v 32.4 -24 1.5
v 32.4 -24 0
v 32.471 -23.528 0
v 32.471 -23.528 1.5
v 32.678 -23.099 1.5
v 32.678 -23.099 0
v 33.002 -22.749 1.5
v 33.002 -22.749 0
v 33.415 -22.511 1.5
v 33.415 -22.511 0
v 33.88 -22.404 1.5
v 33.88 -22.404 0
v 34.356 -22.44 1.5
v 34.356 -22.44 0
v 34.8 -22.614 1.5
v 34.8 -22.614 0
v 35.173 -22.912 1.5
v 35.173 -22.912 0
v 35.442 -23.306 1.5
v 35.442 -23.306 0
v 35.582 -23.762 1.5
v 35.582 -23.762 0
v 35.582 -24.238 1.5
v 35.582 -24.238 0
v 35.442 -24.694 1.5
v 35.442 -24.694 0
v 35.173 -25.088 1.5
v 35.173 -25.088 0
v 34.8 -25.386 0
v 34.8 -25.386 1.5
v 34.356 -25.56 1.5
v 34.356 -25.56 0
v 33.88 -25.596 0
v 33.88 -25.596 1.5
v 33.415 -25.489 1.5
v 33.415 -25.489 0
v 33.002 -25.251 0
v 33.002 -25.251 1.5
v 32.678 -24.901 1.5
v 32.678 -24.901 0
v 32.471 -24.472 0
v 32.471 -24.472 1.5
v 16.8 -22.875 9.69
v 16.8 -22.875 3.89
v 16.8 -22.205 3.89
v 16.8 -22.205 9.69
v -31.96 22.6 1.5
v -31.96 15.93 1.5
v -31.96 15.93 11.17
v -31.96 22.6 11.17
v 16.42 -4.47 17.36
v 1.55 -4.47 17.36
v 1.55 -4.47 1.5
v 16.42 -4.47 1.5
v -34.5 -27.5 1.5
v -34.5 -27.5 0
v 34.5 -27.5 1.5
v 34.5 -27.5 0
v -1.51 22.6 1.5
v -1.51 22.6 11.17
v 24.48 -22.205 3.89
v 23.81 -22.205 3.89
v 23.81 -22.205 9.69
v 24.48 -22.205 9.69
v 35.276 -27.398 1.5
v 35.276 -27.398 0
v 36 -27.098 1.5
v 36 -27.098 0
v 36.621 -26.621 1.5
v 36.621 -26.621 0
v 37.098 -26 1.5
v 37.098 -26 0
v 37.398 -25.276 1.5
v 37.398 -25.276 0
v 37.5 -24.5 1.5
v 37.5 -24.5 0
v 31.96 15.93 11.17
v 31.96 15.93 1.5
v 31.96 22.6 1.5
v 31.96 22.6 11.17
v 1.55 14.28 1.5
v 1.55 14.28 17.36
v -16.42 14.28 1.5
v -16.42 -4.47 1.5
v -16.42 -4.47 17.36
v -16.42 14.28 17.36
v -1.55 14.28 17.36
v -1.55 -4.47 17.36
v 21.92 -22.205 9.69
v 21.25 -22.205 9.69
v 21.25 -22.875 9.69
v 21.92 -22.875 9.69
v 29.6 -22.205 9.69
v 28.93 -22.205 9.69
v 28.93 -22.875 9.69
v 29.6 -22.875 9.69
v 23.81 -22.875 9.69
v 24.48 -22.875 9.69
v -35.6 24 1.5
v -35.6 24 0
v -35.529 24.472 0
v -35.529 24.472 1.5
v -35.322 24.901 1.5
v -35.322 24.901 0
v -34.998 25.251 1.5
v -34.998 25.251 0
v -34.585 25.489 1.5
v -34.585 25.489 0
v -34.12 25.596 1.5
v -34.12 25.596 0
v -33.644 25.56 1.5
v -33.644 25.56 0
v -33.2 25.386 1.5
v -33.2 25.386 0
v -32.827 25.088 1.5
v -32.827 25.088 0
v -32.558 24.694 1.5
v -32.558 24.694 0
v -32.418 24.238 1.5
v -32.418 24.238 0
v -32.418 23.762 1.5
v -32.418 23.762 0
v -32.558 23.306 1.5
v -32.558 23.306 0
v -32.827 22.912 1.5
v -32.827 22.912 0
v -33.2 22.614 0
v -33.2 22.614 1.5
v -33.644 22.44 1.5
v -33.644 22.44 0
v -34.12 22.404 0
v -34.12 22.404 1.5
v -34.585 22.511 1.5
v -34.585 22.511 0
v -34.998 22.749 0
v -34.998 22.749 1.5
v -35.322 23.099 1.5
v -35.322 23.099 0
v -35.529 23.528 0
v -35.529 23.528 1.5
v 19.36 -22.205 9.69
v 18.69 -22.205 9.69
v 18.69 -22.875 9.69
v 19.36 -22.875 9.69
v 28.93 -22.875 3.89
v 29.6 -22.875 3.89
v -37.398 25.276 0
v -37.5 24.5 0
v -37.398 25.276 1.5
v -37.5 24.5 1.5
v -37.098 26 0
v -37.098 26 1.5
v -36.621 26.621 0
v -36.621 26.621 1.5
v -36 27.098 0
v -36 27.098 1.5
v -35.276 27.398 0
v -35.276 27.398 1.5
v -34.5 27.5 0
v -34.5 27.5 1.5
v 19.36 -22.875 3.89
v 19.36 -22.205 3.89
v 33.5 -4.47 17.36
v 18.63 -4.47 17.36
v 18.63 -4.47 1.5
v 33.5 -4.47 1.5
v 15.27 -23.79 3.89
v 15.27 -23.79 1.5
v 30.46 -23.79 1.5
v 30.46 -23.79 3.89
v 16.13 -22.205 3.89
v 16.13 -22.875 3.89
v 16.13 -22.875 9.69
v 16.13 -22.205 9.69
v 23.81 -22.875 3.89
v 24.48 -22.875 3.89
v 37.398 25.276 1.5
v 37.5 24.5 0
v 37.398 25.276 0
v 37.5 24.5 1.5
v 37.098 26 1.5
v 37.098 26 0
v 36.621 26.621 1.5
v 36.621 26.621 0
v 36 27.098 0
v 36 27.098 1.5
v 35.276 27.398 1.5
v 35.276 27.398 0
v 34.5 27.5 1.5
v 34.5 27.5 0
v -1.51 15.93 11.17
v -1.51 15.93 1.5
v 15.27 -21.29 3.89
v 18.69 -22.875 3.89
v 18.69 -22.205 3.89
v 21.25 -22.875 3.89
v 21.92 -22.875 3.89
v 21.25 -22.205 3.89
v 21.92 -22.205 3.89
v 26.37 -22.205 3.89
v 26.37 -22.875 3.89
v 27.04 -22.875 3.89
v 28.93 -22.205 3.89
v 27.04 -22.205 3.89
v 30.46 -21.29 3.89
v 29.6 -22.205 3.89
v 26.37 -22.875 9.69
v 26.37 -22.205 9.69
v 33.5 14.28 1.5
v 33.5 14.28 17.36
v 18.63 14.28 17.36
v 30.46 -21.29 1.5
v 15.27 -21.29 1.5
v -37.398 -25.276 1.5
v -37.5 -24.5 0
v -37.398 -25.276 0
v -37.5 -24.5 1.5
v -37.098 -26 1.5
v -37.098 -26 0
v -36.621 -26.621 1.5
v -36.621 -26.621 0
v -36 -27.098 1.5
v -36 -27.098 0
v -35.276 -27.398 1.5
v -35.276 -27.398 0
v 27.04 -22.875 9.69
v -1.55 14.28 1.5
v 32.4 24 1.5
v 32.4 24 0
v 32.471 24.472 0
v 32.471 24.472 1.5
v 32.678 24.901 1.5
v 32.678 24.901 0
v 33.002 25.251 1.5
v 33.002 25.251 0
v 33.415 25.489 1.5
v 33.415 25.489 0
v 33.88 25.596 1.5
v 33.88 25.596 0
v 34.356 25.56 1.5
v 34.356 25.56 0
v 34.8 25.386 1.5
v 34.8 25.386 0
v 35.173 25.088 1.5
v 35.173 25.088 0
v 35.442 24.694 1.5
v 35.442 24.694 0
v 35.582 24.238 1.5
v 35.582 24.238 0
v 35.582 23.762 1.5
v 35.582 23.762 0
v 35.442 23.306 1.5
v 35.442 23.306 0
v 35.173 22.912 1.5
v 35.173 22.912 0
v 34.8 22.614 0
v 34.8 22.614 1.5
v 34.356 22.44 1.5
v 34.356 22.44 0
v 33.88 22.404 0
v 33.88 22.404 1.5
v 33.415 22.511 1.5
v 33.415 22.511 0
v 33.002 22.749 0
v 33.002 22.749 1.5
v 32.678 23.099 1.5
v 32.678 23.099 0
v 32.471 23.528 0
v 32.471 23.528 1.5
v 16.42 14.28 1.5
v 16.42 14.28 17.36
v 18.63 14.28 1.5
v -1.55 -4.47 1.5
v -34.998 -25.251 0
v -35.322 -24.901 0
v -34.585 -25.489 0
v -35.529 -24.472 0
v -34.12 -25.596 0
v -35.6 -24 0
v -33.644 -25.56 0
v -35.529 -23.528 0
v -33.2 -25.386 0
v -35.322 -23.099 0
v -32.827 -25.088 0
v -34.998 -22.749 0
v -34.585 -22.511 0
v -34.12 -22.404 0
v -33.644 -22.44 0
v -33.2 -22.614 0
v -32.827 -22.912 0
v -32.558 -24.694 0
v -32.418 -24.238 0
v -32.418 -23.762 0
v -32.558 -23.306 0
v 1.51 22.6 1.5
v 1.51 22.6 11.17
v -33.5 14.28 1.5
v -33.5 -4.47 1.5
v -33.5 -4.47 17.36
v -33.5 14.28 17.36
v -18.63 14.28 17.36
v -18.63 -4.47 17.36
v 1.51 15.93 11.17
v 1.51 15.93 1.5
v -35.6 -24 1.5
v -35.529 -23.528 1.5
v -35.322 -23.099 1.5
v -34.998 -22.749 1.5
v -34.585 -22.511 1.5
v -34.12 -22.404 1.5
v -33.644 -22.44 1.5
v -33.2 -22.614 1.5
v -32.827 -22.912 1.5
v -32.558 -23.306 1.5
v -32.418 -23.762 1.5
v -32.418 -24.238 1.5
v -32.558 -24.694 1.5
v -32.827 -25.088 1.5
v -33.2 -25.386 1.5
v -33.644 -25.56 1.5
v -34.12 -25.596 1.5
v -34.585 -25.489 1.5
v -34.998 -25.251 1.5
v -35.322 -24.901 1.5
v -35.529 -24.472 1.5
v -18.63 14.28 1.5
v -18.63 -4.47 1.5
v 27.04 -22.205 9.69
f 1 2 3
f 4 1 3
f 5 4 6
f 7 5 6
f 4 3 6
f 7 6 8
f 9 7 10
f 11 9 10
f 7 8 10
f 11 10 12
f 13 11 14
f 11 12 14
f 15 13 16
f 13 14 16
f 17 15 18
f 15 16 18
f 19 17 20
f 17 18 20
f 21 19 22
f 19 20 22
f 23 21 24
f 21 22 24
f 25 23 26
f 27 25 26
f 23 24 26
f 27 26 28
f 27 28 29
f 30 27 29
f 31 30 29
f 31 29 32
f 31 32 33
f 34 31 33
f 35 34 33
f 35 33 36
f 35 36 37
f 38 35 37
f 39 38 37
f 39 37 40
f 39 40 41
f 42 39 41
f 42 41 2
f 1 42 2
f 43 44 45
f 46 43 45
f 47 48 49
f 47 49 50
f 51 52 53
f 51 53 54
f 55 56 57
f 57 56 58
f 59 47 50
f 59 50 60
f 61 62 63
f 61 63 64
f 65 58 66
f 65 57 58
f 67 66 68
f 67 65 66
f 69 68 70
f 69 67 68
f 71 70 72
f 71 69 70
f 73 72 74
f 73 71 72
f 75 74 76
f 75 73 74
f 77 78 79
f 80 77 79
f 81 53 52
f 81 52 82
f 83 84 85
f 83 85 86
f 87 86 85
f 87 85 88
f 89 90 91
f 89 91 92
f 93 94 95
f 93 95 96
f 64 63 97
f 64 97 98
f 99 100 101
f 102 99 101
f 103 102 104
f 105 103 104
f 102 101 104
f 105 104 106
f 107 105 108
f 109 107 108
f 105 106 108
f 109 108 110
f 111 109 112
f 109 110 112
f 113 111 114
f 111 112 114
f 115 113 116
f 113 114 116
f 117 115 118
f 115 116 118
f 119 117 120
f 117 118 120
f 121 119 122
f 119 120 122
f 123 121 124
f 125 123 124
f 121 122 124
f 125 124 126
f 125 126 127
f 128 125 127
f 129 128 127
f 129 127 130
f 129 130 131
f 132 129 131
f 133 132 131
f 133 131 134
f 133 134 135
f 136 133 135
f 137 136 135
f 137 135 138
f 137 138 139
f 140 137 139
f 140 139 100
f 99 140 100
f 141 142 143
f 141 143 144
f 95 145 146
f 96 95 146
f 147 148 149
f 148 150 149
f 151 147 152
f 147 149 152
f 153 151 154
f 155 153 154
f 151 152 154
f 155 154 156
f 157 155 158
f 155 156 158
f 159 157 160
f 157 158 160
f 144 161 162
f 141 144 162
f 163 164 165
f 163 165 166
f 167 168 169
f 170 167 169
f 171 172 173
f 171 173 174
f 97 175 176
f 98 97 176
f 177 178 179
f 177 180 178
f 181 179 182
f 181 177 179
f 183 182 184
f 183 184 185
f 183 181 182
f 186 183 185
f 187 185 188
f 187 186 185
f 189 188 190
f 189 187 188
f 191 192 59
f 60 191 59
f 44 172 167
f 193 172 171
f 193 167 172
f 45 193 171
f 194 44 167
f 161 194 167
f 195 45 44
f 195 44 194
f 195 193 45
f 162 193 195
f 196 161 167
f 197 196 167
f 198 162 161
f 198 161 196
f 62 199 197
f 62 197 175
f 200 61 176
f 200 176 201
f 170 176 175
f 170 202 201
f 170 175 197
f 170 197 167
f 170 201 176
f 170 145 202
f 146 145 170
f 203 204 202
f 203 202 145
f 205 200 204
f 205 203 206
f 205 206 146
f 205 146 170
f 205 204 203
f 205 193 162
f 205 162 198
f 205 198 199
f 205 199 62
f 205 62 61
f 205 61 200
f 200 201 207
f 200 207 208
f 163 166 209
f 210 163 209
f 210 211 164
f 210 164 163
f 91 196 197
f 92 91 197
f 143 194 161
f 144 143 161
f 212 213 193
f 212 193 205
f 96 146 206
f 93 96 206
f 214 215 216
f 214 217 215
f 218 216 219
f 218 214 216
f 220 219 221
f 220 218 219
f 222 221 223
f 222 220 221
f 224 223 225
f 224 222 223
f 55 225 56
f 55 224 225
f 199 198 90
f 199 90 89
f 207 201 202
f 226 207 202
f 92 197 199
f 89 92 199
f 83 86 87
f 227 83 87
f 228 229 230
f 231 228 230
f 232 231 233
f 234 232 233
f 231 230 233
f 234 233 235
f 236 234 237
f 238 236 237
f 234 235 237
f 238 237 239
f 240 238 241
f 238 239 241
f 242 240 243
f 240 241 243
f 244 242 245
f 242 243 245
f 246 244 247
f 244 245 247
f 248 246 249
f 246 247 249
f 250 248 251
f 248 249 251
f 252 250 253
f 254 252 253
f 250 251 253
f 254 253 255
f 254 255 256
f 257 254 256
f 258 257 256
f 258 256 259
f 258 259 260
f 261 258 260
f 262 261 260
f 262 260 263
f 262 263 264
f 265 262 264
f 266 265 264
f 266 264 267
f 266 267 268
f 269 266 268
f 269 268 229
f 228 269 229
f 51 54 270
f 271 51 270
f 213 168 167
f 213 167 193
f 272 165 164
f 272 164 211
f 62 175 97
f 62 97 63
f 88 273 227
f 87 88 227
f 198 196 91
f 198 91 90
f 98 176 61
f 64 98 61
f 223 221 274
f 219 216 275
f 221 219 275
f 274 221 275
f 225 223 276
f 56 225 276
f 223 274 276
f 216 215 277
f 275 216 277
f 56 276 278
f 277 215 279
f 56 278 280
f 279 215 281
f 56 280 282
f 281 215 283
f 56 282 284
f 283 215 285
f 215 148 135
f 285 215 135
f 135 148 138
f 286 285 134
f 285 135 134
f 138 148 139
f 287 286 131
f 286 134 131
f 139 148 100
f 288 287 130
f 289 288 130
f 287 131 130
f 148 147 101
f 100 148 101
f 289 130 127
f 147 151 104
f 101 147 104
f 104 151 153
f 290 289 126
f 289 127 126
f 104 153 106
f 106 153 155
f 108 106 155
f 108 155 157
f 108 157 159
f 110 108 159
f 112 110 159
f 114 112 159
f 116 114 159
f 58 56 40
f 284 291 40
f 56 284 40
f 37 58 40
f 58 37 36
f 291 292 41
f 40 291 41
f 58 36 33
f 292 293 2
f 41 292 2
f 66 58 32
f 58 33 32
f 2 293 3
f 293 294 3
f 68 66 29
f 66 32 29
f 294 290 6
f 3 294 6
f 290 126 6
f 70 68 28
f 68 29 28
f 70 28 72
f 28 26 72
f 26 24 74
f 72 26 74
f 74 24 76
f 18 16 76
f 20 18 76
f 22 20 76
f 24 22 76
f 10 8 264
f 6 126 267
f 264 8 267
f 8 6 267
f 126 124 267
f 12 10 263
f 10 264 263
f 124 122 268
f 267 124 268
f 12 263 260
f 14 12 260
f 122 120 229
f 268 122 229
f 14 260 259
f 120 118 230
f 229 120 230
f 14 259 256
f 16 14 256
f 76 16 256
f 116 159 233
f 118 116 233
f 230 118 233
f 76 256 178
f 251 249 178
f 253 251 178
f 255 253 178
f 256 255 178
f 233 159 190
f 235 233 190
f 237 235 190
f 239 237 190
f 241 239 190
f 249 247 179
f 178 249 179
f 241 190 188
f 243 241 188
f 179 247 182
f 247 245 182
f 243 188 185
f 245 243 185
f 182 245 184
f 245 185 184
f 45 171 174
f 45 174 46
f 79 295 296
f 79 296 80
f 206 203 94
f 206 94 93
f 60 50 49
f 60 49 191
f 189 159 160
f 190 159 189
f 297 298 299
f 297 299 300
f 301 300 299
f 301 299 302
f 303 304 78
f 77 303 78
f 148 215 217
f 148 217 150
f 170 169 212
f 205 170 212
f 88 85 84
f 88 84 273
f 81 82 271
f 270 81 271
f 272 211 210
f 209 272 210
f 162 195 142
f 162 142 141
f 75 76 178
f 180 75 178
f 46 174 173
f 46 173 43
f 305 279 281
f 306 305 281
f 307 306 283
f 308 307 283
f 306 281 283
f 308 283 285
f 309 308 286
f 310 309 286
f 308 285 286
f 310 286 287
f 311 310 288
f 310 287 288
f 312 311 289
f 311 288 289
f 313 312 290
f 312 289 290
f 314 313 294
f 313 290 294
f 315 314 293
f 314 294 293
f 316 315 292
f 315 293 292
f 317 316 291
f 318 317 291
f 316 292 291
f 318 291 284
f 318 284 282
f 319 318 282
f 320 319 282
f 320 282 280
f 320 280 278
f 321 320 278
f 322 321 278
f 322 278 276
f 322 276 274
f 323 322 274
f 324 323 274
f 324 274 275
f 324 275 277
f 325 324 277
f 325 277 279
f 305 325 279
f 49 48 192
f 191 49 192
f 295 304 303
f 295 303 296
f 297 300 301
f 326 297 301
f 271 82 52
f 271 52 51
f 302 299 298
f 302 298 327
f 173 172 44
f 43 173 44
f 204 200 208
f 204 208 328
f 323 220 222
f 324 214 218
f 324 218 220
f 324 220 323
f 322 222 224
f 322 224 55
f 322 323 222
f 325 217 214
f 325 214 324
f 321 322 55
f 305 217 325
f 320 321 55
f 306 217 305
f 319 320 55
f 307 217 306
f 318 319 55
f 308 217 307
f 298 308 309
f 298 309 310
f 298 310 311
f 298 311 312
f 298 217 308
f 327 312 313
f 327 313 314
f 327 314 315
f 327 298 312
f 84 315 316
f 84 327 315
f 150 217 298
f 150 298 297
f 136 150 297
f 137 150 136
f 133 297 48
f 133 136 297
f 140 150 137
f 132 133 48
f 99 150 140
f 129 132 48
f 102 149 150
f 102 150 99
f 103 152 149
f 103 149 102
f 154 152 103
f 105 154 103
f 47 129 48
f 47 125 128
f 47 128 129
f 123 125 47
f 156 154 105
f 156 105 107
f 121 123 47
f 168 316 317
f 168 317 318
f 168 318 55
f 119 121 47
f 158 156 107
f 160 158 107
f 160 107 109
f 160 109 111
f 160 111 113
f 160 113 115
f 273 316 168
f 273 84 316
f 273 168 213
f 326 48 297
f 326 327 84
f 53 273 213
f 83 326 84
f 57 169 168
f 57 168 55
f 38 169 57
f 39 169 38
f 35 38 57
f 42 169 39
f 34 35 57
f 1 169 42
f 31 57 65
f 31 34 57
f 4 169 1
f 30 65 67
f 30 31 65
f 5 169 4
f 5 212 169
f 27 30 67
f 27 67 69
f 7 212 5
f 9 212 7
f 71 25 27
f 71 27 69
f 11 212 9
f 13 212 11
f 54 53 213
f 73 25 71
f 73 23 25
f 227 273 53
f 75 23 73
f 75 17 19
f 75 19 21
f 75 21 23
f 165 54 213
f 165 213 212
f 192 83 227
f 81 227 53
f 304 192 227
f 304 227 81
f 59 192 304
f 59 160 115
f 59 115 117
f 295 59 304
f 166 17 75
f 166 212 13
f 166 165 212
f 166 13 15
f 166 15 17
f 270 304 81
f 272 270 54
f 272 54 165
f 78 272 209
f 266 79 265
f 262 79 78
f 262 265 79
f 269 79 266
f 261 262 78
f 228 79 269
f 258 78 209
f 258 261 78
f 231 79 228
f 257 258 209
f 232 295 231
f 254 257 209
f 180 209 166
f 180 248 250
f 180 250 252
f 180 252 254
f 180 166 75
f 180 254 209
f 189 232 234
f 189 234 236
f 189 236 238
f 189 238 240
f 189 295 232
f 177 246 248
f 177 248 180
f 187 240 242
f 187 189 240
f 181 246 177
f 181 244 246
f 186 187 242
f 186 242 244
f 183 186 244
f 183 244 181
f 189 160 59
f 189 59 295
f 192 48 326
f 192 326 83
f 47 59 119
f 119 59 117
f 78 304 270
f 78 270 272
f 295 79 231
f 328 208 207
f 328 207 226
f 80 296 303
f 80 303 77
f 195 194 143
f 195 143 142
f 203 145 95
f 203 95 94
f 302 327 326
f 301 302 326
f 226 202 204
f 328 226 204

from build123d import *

# Parameters (mm, degrees)
CROQUIS1_W                   = 75
CROQUIS1_H                   = 55
SALIENTE_EXTRUIR1_DEPTH      = 1.5
REDONDEO1_R                  = 3
TALADRO_DE_MARGEN_PARA_M31_D = 3.2
CROQUIS4_W                   = 14.87
CROQUIS4_H                   = 18.75
SALIENTE_EXTRUIR2_DEPTH      = 15.86
CROQUIS5_W                   = 30.45
CROQUIS5_H                   = 6.67
SALIENTE_EXTRUIR3_DEPTH      = 9.67
CROQUIS6_W                   = 15.19
CROQUIS6_H                   = 2.5
SALIENTE_EXTRUIR4_DEPTH      = 2.39
CROQUIS7_W                   = 0.67
CROQUIS7_H                   = 0.67
SALIENTE_EXTRUIR5_DEPTH      = 5.8


with BuildPart() as part:
    # Croquis1 → Saliente-Extruir1 (new body)
    with BuildSketch(Plane.XY):
        Rectangle(CROQUIS1_W, CROQUIS1_H)
    extrude(amount=SALIENTE_EXTRUIR1_DEPTH)

    # Redondeo1
    redondeo1_edges = [part.edges().sort_by_distance(p)[0] for p in [
        (-37.5, 27.5, 0.75),
        (37.5, 27.5, 0.75),
        (37.5, -27.5, 0.75),
        (-37.5, -27.5, 0.75),
    ]]
    fillet(redondeo1_edges, radius=REDONDEO1_R)

    # Taladro de margen para M31 (through all)
    with Locations(Plane.XY.offset(1.5)):
        with Locations((-34, 24), (-34, -24), (34, 24), (34, -24)):
            Hole(TALADRO_DE_MARGEN_PARA_M31_D / 2)

    # Croquis4 → Saliente-Extruir2 (add)
    with BuildSketch(Plane.XY.offset(1.5)):
        with Locations((-26.065, 4.905)):
            Rectangle(CROQUIS4_W, CROQUIS4_H)
        with Locations((-8.985, 4.905)):
            Rectangle(CROQUIS4_W, CROQUIS4_H)
        with Locations((8.985, 4.905)):
            Rectangle(CROQUIS4_W, CROQUIS4_H)
        with Locations((26.065, 4.905)):
            Rectangle(CROQUIS4_W, CROQUIS4_H)
    extrude(amount=SALIENTE_EXTRUIR2_DEPTH)

    # Croquis5 → Saliente-Extruir3 (add)
    with BuildSketch(Plane.XY.offset(1.5)):
        with Locations((-16.735, 19.265)):
            Rectangle(CROQUIS5_W, CROQUIS5_H)
        with Locations((16.735, 19.265)):
            Rectangle(CROQUIS5_W, CROQUIS5_H)
    extrude(amount=SALIENTE_EXTRUIR3_DEPTH)

    # Croquis6 → Saliente-Extruir4 (add)
    with BuildSketch(Plane.XY.offset(1.5)):
        with Locations((22.865, -22.54)):
            Rectangle(CROQUIS6_W, CROQUIS6_H)
    extrude(amount=SALIENTE_EXTRUIR4_DEPTH)

    # Croquis7 → Saliente-Extruir5 (add)
    with BuildSketch(Plane.XY.offset(3.89)):
        with Locations((16.465, -22.54)):
            Rectangle(CROQUIS7_W, CROQUIS7_H)
        with Locations((19.025, -22.54)):
            Rectangle(CROQUIS7_W, CROQUIS7_H)
        with Locations((21.585, -22.54)):
            Rectangle(CROQUIS7_W, CROQUIS7_H)
        with Locations((24.145, -22.54)):
            Rectangle(CROQUIS7_W, CROQUIS7_H)
        with Locations((26.705, -22.54)):
            Rectangle(CROQUIS7_W, CROQUIS7_H)
        with Locations((29.265, -22.54)):
            Rectangle(CROQUIS7_W, CROQUIS7_H)
    extrude(amount=SALIENTE_EXTRUIR5_DEPTH)


solid = part.part
